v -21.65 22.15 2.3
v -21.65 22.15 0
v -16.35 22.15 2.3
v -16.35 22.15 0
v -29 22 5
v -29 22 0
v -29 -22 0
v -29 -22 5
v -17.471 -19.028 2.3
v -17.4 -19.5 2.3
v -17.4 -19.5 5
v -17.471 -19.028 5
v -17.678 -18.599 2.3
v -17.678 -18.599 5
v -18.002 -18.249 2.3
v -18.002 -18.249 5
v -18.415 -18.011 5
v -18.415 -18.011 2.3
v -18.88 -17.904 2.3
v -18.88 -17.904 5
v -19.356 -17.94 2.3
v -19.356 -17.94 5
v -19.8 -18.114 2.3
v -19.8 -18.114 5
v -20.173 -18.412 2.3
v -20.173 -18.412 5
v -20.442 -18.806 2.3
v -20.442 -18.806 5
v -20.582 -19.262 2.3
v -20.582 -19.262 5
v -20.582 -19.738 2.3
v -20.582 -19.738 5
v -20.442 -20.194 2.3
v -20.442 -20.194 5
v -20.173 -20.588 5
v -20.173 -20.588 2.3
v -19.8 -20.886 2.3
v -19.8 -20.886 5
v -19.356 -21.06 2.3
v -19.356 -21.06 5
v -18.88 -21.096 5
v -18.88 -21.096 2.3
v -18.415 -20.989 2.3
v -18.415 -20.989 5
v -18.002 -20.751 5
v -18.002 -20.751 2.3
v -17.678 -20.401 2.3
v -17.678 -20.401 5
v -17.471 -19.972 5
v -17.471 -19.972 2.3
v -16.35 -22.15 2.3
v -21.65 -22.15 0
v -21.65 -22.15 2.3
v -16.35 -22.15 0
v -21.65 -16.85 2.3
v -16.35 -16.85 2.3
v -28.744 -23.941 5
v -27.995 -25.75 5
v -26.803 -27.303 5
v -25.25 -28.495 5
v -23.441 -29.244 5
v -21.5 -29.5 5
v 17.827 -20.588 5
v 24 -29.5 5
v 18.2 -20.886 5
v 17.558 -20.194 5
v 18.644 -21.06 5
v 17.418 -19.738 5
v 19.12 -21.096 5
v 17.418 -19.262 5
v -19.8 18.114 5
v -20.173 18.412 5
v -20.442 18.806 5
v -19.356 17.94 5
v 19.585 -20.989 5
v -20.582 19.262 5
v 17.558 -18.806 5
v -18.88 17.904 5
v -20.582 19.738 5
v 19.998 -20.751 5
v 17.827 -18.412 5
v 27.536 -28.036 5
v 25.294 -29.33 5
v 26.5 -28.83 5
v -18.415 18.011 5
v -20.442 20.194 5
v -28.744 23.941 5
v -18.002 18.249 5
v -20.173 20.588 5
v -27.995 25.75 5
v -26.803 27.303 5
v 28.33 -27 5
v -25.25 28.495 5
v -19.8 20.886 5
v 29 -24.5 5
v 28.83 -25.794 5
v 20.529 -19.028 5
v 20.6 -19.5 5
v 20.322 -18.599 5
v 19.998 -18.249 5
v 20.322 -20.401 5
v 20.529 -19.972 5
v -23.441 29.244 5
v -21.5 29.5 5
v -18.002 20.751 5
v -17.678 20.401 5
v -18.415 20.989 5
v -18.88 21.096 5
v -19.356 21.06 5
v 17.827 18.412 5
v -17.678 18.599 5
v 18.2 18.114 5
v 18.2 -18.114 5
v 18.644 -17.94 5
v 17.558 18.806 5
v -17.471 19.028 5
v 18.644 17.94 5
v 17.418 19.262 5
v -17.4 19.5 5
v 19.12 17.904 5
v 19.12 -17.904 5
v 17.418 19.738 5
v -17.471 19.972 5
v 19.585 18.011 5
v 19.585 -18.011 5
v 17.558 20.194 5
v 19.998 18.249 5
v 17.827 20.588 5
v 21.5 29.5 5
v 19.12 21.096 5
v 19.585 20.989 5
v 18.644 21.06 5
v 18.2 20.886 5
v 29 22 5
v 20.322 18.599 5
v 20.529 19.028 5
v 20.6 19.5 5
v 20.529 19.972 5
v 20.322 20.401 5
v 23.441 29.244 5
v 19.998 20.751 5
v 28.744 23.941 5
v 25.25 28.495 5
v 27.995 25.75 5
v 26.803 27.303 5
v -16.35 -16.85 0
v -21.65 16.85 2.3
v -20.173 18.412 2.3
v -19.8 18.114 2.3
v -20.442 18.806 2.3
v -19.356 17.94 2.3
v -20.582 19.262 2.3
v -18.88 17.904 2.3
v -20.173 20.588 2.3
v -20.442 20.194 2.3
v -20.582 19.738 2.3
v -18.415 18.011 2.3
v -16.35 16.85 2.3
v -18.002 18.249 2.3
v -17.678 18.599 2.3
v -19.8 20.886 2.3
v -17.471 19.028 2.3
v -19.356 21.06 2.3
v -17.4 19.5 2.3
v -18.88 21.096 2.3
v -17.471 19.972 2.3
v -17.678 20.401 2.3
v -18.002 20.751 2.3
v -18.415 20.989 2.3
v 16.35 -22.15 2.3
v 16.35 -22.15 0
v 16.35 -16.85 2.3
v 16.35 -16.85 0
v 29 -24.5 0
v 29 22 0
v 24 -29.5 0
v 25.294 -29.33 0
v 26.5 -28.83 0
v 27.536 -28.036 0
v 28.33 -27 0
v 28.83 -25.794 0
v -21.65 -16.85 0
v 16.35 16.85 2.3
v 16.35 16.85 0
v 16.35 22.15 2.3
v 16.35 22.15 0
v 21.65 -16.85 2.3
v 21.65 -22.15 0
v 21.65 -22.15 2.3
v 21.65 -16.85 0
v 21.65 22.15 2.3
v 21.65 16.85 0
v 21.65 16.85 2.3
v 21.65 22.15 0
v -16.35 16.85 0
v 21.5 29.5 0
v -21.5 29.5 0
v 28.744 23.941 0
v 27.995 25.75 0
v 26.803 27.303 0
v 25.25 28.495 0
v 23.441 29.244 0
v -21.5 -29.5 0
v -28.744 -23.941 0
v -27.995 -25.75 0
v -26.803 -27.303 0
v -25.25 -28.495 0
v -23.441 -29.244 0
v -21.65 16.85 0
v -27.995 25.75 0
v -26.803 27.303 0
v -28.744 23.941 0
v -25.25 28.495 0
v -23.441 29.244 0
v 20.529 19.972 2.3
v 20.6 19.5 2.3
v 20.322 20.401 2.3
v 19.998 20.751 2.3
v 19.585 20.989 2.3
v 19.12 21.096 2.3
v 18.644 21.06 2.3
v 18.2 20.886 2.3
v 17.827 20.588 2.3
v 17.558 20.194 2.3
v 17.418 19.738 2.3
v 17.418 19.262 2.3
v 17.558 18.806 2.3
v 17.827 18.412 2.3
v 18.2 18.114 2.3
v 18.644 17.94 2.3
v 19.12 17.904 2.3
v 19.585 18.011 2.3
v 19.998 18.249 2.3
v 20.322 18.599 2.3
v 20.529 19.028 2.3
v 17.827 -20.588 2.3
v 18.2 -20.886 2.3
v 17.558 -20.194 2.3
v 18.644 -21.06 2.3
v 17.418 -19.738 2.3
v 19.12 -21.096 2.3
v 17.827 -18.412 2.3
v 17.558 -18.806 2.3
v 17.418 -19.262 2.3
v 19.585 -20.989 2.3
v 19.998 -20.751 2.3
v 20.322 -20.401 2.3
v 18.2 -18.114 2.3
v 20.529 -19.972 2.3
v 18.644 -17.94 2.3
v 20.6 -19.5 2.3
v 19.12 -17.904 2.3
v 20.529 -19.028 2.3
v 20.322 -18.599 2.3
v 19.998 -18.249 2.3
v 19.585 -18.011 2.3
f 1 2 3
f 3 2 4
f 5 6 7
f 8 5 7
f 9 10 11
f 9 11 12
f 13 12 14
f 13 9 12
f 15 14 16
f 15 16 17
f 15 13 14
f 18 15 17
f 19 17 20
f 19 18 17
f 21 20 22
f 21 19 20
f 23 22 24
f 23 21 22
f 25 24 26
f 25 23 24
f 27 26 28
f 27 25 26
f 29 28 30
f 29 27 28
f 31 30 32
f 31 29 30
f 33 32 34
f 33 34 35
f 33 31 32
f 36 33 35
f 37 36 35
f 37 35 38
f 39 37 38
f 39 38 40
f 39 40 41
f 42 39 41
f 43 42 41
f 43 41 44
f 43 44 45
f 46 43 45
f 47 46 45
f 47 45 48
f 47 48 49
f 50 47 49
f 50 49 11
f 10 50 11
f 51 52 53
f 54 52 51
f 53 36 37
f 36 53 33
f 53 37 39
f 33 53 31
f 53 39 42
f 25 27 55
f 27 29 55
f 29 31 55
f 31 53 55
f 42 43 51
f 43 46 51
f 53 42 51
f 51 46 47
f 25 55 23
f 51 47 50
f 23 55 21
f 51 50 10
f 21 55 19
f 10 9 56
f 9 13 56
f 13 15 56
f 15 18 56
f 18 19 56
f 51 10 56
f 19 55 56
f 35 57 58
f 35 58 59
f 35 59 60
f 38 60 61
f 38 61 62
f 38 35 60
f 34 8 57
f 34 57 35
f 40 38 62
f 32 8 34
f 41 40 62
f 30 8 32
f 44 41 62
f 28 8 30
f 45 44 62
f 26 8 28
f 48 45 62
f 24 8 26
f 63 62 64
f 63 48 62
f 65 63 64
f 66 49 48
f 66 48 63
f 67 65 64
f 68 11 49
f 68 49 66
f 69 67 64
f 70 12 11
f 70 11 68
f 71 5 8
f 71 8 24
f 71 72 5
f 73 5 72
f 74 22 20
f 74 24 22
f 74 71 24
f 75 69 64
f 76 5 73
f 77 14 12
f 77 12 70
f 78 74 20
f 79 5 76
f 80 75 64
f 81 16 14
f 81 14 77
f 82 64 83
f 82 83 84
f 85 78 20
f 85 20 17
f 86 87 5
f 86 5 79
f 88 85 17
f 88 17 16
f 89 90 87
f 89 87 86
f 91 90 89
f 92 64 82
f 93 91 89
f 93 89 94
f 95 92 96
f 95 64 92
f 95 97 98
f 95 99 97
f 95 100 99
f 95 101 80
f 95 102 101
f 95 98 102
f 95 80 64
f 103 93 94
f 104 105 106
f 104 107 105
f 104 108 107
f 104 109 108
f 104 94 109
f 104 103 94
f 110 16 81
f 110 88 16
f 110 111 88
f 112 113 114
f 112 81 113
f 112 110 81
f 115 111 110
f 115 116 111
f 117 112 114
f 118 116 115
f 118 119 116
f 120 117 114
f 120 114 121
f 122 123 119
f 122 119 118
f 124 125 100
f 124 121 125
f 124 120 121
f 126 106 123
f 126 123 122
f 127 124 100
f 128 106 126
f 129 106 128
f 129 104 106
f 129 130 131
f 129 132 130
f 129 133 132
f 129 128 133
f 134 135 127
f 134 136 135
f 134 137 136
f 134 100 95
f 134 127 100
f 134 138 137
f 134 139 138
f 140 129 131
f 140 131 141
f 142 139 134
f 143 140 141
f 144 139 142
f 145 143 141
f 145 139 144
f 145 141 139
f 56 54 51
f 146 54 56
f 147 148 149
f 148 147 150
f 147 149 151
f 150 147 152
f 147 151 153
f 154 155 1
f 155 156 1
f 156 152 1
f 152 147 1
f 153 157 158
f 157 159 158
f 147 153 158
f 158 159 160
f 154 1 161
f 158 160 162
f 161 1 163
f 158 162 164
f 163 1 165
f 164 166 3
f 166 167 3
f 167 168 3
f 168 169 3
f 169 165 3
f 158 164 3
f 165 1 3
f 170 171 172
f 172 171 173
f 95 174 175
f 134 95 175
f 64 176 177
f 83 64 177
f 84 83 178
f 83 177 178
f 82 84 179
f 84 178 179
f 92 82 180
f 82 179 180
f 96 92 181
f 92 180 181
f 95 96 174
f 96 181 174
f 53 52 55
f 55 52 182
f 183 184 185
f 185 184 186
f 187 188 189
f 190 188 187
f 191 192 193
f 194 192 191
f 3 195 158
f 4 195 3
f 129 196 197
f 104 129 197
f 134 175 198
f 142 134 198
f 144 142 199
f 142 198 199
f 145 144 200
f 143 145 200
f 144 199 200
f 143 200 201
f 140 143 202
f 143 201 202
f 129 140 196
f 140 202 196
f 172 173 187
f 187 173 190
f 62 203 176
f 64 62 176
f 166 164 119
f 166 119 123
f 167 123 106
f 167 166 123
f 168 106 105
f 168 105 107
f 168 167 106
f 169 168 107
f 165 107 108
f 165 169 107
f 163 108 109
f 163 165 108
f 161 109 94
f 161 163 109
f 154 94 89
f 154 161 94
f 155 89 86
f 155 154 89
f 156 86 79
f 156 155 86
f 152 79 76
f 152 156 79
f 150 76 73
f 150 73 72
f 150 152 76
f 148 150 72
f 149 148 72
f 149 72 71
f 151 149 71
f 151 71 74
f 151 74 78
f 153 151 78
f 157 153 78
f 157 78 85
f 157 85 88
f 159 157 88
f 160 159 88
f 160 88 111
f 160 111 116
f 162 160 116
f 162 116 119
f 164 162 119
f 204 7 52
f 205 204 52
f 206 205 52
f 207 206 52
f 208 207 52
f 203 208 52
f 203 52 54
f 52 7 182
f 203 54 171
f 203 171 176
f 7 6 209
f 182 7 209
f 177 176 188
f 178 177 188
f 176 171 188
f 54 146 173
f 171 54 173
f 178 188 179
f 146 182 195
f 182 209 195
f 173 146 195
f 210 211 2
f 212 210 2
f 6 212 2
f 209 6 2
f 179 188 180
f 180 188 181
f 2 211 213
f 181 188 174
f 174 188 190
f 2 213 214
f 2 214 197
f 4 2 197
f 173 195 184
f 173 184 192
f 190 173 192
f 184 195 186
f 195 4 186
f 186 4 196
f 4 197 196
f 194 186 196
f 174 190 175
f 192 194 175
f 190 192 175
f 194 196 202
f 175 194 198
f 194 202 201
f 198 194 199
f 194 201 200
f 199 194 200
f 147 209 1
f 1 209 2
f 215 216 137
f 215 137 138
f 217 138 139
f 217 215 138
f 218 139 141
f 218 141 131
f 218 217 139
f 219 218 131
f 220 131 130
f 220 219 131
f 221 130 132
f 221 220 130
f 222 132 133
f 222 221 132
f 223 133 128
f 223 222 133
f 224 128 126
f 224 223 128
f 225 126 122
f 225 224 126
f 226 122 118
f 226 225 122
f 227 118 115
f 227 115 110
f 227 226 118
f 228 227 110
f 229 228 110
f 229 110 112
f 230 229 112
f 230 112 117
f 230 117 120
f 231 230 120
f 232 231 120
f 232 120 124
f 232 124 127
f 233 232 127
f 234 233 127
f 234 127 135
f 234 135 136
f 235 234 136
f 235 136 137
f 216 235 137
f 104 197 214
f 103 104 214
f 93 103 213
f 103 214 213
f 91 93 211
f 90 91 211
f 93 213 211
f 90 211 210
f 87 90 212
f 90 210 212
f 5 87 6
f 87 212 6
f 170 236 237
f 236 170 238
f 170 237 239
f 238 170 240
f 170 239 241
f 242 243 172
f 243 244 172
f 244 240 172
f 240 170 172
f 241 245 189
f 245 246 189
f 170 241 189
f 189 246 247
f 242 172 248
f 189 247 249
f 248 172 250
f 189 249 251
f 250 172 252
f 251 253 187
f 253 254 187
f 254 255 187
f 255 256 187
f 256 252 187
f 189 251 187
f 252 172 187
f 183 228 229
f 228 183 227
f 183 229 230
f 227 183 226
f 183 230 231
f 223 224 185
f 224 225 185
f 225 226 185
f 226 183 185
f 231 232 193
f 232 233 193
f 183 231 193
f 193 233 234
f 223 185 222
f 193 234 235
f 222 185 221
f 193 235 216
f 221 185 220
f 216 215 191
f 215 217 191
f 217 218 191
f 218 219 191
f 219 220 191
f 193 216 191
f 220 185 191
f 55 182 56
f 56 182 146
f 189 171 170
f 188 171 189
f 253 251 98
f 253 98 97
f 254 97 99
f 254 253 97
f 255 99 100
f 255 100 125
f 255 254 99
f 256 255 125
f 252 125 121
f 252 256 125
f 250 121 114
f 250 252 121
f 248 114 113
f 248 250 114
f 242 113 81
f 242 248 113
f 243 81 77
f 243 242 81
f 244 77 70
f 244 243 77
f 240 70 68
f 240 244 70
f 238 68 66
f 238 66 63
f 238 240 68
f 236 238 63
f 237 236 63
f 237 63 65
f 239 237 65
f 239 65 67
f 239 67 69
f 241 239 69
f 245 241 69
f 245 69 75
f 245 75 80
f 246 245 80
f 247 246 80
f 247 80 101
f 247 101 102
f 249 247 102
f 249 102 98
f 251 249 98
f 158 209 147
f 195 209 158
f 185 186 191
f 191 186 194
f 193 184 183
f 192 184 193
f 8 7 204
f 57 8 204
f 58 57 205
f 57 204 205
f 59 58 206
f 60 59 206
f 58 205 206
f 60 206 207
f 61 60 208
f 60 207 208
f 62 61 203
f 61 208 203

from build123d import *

# Parameters (mm, degrees)
F0_W     = 5.3
F0_H     = 5.3
F0_R     = 1.6
F1_DEPTH = 5
F2_DEPTH = 2.3


with BuildPart() as f1:
    # F0 (on Top) → F1 (new body)
    with BuildSketch(Plane.XY):
        with BuildLine():
            ThreePointArc((29, 22), (26.803301, 27.303301), (21.5, 29.5))
            Line((21.5, 29.5), (-21.5, 29.5))
            ThreePointArc((-21.5, 29.5), (-26.803301, 27.303301), (-29, 22))
            Line((-29, 22), (-29, -22))
            ThreePointArc((-29, -22), (-26.803301, -27.303301), (-21.5, -29.5))
            Line((-21.5, -29.5), (24, -29.5))
            ThreePointArc((24, -29.5), (27.535534, -28.035534), (29, -24.5))
            Line((29, -24.5), (29, 22))
        make_face()
        with Locations((-19, -19.5)):
            Rectangle(F0_W, F0_H, mode=Mode.SUBTRACT)
        with Locations((19, -19.5)):
            Rectangle(F0_W, F0_H, mode=Mode.SUBTRACT)
        with Locations((-19, 19.5)):
            Rectangle(F0_W, F0_H, mode=Mode.SUBTRACT)
        with Locations((19, 19.5)):
            Rectangle(F0_W, F0_H, mode=Mode.SUBTRACT)
        with Locations((-19, 19.5)):
            Rectangle(F0_W, F0_H)
        with Locations((-19, 19.5)):
            Circle(F0_R, mode=Mode.SUBTRACT)
        with Locations((19, 19.5)):
            Rectangle(F0_W, F0_H)
        with Locations((19, 19.5)):
            Circle(F0_R, mode=Mode.SUBTRACT)
        with Locations((19, -19.5)):
            Rectangle(F0_W, F0_H)
        with Locations((19, -19.5)):
            Circle(F0_R, mode=Mode.SUBTRACT)
        with Locations((-19, -19.5)):
            Rectangle(F0_W, F0_H)
        with Locations((-19, -19.5)):
            Circle(F0_R, mode=Mode.SUBTRACT)
    extrude(amount=F1_DEPTH)

    # F0 (on Top) → F2 (cut)
    with BuildSketch(Plane.XY):
        with Locations((-19, 19.5)):
            Rectangle(F0_W, F0_H)
        with Locations((-19, 19.5)):
            Circle(F0_R, mode=Mode.SUBTRACT)
        with Locations((19, 19.5)):
            Rectangle(F0_W, F0_H)
        with Locations((19, 19.5)):
            Circle(F0_R, mode=Mode.SUBTRACT)
        with Locations((-19, -19.5)):
            Rectangle(F0_W, F0_H)
        with Locations((-19, -19.5)):
            Circle(F0_R, mode=Mode.SUBTRACT)
        with Locations((19, -19.5)):
            Rectangle(F0_W, F0_H)
        with Locations((19, -19.5)):
            Circle(F0_R, mode=Mode.SUBTRACT)
    extrude(amount=F2_DEPTH, mode=Mode.SUBTRACT)


solid = f1.part
